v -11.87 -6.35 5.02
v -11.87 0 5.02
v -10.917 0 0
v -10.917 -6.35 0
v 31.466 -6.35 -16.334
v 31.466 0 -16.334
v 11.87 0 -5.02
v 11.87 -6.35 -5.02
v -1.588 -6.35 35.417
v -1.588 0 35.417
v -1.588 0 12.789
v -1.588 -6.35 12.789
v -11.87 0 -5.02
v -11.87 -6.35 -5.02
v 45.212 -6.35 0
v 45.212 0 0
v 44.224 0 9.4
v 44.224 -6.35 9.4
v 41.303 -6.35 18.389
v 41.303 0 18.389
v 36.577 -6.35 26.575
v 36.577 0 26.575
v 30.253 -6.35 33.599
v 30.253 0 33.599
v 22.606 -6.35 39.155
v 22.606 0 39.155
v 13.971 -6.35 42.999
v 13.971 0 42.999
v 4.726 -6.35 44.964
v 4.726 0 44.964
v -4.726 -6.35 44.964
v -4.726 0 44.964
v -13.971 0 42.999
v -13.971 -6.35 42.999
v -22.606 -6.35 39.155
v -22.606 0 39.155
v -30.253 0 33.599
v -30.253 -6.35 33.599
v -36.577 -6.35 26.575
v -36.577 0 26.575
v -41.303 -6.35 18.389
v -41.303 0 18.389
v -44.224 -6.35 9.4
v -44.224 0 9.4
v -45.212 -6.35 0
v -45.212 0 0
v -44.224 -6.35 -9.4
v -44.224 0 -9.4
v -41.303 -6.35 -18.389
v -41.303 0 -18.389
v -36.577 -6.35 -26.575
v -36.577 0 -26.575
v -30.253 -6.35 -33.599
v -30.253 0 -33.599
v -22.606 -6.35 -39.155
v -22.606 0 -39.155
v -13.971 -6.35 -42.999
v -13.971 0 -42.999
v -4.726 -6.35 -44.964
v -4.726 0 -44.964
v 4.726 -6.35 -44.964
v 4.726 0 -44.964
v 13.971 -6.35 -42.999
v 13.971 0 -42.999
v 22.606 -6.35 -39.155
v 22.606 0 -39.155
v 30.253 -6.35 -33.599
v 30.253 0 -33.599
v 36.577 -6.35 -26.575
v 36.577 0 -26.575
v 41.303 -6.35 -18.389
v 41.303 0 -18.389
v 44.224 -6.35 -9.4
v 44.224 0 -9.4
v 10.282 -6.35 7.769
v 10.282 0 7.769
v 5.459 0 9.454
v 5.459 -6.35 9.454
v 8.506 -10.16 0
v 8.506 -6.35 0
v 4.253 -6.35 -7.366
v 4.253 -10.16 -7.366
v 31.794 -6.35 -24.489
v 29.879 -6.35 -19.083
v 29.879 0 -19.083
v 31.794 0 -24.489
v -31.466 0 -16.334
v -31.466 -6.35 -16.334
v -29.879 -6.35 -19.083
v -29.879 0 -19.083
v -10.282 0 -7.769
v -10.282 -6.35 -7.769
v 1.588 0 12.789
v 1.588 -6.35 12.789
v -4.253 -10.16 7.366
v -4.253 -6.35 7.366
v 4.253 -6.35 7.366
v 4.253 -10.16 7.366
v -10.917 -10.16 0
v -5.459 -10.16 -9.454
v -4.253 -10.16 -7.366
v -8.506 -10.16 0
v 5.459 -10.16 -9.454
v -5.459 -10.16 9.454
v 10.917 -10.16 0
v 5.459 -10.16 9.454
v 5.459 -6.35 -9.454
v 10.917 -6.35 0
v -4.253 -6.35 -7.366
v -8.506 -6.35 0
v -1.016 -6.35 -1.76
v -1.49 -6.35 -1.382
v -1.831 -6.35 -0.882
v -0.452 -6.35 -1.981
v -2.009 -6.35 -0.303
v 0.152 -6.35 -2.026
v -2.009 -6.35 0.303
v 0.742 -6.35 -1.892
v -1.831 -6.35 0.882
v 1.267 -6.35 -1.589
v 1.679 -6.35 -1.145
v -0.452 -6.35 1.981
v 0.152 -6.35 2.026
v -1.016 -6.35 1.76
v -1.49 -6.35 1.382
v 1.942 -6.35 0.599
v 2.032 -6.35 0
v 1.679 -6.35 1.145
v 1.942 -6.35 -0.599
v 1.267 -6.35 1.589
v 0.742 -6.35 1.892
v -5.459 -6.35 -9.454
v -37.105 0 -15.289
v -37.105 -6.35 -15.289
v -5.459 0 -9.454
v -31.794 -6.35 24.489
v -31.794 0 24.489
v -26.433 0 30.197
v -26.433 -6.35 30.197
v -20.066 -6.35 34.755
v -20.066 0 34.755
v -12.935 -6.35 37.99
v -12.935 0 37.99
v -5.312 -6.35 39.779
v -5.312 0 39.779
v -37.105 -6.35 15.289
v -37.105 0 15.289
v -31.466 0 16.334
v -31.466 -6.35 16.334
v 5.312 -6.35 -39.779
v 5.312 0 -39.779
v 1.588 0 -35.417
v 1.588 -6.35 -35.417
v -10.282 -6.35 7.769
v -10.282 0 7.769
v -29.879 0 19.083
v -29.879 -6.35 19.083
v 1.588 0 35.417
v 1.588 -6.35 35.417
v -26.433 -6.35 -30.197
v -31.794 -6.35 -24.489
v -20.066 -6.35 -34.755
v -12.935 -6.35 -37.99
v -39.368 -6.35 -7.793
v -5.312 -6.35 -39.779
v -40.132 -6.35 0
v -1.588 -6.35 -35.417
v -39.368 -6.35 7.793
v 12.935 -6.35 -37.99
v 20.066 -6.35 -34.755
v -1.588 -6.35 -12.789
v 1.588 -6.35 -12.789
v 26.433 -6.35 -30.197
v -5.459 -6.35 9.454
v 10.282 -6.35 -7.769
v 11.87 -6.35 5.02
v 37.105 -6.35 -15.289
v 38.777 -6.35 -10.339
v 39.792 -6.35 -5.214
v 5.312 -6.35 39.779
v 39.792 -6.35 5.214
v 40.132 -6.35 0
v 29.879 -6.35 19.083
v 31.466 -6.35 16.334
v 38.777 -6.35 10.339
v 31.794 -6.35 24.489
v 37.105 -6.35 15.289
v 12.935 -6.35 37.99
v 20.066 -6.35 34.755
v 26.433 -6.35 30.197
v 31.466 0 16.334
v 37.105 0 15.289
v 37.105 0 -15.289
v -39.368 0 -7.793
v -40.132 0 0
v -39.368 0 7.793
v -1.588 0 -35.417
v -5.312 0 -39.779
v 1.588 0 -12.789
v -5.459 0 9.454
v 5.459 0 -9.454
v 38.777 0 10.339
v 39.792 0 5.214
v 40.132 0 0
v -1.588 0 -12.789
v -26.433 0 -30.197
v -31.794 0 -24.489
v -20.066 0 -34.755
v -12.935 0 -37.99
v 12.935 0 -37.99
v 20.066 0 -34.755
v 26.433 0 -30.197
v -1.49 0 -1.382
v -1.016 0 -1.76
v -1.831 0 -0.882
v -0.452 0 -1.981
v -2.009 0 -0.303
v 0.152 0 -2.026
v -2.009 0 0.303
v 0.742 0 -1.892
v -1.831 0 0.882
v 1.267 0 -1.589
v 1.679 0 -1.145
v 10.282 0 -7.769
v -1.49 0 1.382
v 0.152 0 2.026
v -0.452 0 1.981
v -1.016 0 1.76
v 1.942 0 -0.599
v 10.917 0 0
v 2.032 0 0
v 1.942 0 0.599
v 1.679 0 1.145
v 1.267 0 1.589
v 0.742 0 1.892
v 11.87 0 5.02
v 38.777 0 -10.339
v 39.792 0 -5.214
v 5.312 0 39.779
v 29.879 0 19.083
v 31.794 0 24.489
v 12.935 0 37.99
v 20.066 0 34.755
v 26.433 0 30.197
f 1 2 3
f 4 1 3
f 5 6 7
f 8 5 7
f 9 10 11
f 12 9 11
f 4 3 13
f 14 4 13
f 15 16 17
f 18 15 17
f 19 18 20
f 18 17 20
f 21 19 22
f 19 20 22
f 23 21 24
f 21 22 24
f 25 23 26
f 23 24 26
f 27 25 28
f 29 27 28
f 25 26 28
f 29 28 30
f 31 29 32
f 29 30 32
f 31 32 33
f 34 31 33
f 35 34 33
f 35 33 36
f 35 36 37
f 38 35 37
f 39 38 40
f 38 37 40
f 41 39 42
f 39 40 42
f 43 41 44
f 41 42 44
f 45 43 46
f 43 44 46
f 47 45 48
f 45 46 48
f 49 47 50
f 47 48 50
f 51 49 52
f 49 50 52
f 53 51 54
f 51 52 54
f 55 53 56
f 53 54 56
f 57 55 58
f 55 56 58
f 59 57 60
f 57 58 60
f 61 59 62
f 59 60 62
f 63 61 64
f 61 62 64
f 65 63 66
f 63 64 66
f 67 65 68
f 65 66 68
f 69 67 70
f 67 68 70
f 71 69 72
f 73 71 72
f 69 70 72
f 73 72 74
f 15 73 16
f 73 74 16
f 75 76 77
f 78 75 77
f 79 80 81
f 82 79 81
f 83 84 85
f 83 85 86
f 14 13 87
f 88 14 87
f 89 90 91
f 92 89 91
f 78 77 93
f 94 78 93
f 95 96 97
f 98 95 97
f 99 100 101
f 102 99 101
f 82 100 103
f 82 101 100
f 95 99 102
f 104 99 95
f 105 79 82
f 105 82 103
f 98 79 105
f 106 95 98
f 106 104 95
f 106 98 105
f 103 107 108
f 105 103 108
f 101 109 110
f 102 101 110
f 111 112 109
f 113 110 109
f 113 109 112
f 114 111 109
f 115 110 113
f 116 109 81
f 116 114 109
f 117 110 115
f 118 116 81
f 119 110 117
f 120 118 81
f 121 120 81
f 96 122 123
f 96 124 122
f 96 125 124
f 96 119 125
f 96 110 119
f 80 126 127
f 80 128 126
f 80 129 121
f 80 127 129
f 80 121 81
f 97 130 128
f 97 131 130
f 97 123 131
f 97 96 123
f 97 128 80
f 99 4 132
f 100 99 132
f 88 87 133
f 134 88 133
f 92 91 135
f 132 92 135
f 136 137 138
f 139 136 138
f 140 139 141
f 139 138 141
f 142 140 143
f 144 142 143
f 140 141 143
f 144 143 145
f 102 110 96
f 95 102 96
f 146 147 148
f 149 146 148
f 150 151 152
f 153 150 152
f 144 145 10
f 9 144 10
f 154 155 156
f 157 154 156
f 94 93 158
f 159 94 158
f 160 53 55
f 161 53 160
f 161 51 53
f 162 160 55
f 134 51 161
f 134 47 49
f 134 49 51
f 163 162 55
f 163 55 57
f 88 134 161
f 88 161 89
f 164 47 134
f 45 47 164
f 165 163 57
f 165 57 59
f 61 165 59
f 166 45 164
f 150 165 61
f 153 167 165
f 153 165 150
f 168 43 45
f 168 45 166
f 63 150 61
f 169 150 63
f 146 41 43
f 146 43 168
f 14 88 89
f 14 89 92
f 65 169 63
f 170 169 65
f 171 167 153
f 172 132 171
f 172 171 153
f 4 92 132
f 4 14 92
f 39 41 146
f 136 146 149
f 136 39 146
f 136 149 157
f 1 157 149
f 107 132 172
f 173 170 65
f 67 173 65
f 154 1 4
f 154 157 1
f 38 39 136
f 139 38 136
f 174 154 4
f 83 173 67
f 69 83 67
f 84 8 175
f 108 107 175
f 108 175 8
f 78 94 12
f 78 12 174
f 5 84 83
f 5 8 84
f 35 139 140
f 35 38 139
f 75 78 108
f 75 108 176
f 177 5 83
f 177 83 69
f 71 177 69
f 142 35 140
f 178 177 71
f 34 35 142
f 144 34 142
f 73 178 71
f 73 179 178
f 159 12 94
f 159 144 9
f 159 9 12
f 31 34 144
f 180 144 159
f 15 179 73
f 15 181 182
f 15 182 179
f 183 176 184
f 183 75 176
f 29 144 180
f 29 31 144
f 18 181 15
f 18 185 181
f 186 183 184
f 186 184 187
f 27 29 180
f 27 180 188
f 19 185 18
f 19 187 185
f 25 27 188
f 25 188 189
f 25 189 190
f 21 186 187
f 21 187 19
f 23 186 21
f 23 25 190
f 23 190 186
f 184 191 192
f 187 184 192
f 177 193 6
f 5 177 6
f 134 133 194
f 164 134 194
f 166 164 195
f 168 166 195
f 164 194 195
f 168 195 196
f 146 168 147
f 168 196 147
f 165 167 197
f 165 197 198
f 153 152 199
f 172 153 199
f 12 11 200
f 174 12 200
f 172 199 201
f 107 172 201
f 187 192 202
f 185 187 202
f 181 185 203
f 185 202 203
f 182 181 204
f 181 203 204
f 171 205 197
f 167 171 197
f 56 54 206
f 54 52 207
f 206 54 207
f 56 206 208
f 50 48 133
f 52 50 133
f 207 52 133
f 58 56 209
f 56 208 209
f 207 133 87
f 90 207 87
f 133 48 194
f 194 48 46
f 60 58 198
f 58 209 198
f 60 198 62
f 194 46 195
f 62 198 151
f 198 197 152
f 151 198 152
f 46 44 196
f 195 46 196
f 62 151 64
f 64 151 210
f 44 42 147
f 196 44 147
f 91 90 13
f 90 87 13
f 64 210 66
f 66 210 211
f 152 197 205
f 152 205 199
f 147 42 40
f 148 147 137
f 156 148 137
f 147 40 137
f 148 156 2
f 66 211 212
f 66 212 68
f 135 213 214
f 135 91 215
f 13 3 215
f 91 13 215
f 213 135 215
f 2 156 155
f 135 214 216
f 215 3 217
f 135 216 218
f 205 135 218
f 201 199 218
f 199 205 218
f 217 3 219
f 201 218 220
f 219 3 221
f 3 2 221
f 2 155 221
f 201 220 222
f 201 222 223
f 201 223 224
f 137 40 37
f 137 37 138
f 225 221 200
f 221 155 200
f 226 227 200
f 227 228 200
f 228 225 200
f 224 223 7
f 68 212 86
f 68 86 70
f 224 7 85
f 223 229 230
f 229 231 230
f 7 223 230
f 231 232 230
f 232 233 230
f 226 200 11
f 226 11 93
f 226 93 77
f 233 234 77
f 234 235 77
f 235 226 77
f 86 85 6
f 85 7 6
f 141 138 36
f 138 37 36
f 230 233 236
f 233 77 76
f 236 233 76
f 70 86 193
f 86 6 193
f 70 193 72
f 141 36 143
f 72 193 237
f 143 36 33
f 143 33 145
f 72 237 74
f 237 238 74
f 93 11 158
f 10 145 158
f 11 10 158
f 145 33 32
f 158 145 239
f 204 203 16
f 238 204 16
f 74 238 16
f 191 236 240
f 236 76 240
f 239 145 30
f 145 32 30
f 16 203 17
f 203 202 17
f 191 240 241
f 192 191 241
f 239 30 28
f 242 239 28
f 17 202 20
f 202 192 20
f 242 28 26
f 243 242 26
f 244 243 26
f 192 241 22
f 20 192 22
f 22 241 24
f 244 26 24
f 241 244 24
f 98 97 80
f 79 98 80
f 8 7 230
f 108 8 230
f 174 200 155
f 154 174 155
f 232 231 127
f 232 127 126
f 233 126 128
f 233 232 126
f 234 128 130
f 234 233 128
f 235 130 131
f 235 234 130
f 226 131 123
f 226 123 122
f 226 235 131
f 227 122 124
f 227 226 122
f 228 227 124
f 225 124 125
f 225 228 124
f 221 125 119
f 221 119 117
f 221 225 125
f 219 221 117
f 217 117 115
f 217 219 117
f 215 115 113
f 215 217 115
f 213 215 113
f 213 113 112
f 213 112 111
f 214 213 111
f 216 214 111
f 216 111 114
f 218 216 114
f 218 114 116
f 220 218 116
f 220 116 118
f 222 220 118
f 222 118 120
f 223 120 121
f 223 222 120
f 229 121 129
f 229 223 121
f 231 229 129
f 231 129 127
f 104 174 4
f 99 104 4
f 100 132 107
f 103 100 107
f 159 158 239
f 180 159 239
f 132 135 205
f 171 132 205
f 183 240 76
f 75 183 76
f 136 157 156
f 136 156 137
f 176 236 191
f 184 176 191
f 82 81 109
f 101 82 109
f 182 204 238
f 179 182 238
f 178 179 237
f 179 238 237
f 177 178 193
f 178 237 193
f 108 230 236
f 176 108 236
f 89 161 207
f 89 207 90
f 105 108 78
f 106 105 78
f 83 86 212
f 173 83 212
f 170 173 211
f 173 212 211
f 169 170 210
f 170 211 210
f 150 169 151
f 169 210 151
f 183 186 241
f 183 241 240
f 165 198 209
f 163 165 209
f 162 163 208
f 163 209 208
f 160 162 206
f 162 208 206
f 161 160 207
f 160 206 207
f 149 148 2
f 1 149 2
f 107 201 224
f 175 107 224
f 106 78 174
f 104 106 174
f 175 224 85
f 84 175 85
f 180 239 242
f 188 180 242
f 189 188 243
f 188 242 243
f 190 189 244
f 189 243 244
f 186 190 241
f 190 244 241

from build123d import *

# Parameters (mm, degrees)
F0_R     = 45.212
F0_R_2   = 2.032
F1_DEPTH = 6.35
F2_DEPTH = 10.16


with BuildPart() as f1:
    # F0 (on Front) → F1 (new body)
    with BuildSketch(Plane.XZ):
        Circle(F0_R)
        with BuildLine():
            ThreePointArc((37.1053751064, 15.2894918888), (39.3680729638, 7.7930902161), (40.132, 0))
            ThreePointArc((40.132, 0), (39.3680729638, -7.7930902161), (37.1053751064, -15.2894918888))
            ThreePointArc((37.1053751064, -15.2894918888), (34.7553315047, -20.066), (31.7937759398, -24.4894515147))
            ThreePointArc((31.7937759398, -24.4894515147), (20.066, -34.7553315047), (5.3115991666, -39.7789434034))
            ThreePointArc((5.3115991666, -39.7789434034), (0, -40.132), (-5.3115991666, -39.7789434034))
            ThreePointArc((-5.3115991666, -39.7789434034), (-20.066, -34.7553315047), (-31.7937759398, -24.4894515147))
            ThreePointArc((-31.7937759398, -24.4894515147), (-34.7553315047, -20.066), (-37.1053751064, -15.2894918888))
            ThreePointArc((-37.1053751064, -15.2894918888), (-40.132, 0), (-37.1053751064, 15.2894918888))
            ThreePointArc((-37.1053751064, 15.2894918888), (-34.7553315047, 20.066), (-31.7937759398, 24.4894515147))
            ThreePointArc((-31.7937759398, 24.4894515147), (-20.066, 34.7553315047), (-5.3115991666, 39.7789434034))
            ThreePointArc((-5.3115991666, 39.7789434034), (0, 40.132), (5.3115991666, 39.7789434034))
            ThreePointArc((5.3115991666, 39.7789434034), (20.066, 34.7553315047), (31.7937759398, 24.4894515147))
            ThreePointArc((31.7937759398, 24.4894515147), (34.7553315047, 20.066), (37.1053751064, 15.2894918888))
        make_face(mode=Mode.SUBTRACT)
        Polygon((4.2527620829, -7.366), (8.5055241657, 0), (4.2527620829, 7.366), (-4.2527620829, 7.366), (-8.5055241657, 0), (-4.2527620829, -7.366), align=None)
        Circle(F0_R_2, mode=Mode.SUBTRACT)
        with BuildLine():
            Line((1.5875, 35.4173183441), (5.3115991666, 39.7789434034))
            ThreePointArc((5.3115991666, 39.7789434034), (0, 40.132), (-5.3115991666, 39.7789434034))
            Line((-5.3115991666, 39.7789434034), (-1.5875, 35.4173183441))
            Line((-1.5875, 35.4173183441), (-1.5875, 12.7893453464))
            Line((-1.5875, 12.7893453464), (-5.4585231293, 9.4544393942))
            Line((-5.4585231293, 9.4544393942), (5.4585231293, 9.4544393942))
            Line((5.4585231293, 9.4544393942), (1.5875, 12.7893453464))
            Line((1.5875, 12.7893453464), (1.5875, 35.4173183441))
        make_face()
        with BuildLine():
            Line((-29.8785474199, 19.0834745006), (-31.7937759398, 24.4894515147))
            ThreePointArc((-31.7937759398, 24.4894515147), (-34.7553315047, 20.066), (-37.1053751064, 15.2894918888))
            Line((-37.1053751064, 15.2894918888), (-31.4660474199, 16.3338438436))
            Line((-31.4660474199, 16.3338438436), (-11.8696479677, 5.0198573447))
            Line((-11.8696479677, 5.0198573447), (-10.9170462585, 0))
            Line((-10.9170462585, 0), (-5.4585231293, 9.4544393942))
            Line((-5.4585231293, 9.4544393942), (-10.2821479677, 7.7694880017))
            Line((-10.2821479677, 7.7694880017), (-29.8785474199, 19.0834745006))
        make_face()
        with BuildLine():
            ThreePointArc((-37.1053751064, -15.2894918888), (-34.7553315047, -20.066), (-31.7937759398, -24.4894515147))
            Line((-31.7937759398, -24.4894515147), (-29.8785474199, -19.0834745006))
            Line((-29.8785474199, -19.0834745006), (-10.2821479677, -7.7694880017))
            Line((-10.2821479677, -7.7694880017), (-5.4585231293, -9.4544393942))
            Line((-5.4585231293, -9.4544393942), (-10.9170462585, 0))
            Line((-10.9170462585, 0), (-11.8696479677, -5.0198573447))
            Line((-11.8696479677, -5.0198573447), (-31.4660474199, -16.3338438436))
            Line((-31.4660474199, -16.3338438436), (-37.1053751064, -15.2894918888))
        make_face()
        with BuildLine():
            ThreePointArc((-5.3115991666, -39.7789434034), (0, -40.132), (5.3115991666, -39.7789434034))
            Line((5.3115991666, -39.7789434034), (1.5875, -35.4173183441))
            Line((1.5875, -35.4173183441), (1.5875, -12.7893453464))
            Line((1.5875, -12.7893453464), (5.4585231293, -9.4544393942))
            Line((5.4585231293, -9.4544393942), (-5.4585231293, -9.4544393942))
            Line((-5.4585231293, -9.4544393942), (-1.5875, -12.7893453464))
            Line((-1.5875, -12.7893453464), (-1.5875, -35.4173183441))
            Line((-1.5875, -35.4173183441), (-5.3115991666, -39.7789434034))
        make_face()
        with BuildLine():
            ThreePointArc((31.7937759398, -24.4894515147), (34.7553315047, -20.066), (37.1053751064, -15.2894918888))
            Line((37.1053751064, -15.2894918888), (31.4660474199, -16.3338438436))
            Line((31.4660474199, -16.3338438436), (11.8696479677, -5.0198573447))
            Line((11.8696479677, -5.0198573447), (10.9170462585, 0))
            Line((10.9170462585, 0), (5.4585231293, -9.4544393942))
            Line((5.4585231293, -9.4544393942), (10.2821479677, -7.7694880017))
            Line((10.2821479677, -7.7694880017), (29.8785474199, -19.0834745006))
            Line((29.8785474199, -19.0834745006), (31.7937759398, -24.4894515147))
        make_face()
        with BuildLine():
            Line((31.4660474199, 16.3338438436), (37.1053751064, 15.2894918888))
            ThreePointArc((37.1053751064, 15.2894918888), (34.7553315047, 20.066), (31.7937759398, 24.4894515147))
            Line((31.7937759398, 24.4894515147), (29.8785474199, 19.0834745006))
            Line((29.8785474199, 19.0834745006), (10.2821479677, 7.7694880017))
            Line((10.2821479677, 7.7694880017), (5.4585231293, 9.4544393942))
            Line((5.4585231293, 9.4544393942), (10.9170462585, 0))
            Line((10.9170462585, 0), (11.8696479677, 5.0198573447))
            Line((11.8696479677, 5.0198573447), (31.4660474199, 16.3338438436))
        make_face()
        Polygon((-4.2527620829, 7.366), (-5.4585231293, 9.4544393942), (-10.9170462585, 0), (-8.5055241657, 0), align=None)
        Polygon((-10.9170462585, 0), (-5.4585231293, -9.4544393942), (-4.2527620829, -7.366), (-8.5055241657, 0), align=None)
        Polygon((-5.4585231293, -9.4544393942), (5.4585231293, -9.4544393942), (4.2527620829, -7.366), (-4.2527620829, -7.366), align=None)
        Polygon((5.4585231293, -9.4544393942), (10.9170462585, 0), (8.5055241657, 0), (4.2527620829, -7.366), align=None)
        Polygon((8.5055241657, 0), (10.9170462585, 0), (5.4585231293, 9.4544393942), (4.2527620829, 7.366), align=None)
        Polygon((4.2527620829, 7.366), (5.4585231293, 9.4544393942), (-5.4585231293, 9.4544393942), (-4.2527620829, 7.366), align=None)
    extrude(amount=F1_DEPTH)

    # F0 (on Front) → F2 (join)
    with BuildSketch(Plane.XZ):
        Polygon((-10.9170462585, 0), (-5.4585231293, -9.4544393942), (-4.2527620829, -7.366), (-8.5055241657, 0), align=None)
        Polygon((-5.4585231293, -9.4544393942), (5.4585231293, -9.4544393942), (4.2527620829, -7.366), (-4.2527620829, -7.366), align=None)
        Polygon((5.4585231293, -9.4544393942), (10.9170462585, 0), (8.5055241657, 0), (4.2527620829, -7.366), align=None)
        Polygon((8.5055241657, 0), (10.9170462585, 0), (5.4585231293, 9.4544393942), (4.2527620829, 7.366), align=None)
        Polygon((4.2527620829, 7.366), (5.4585231293, 9.4544393942), (-5.4585231293, 9.4544393942), (-4.2527620829, 7.366), align=None)
        Polygon((-4.2527620829, 7.366), (-5.4585231293, 9.4544393942), (-10.9170462585, 0), (-8.5055241657, 0), align=None)
    extrude(amount=F2_DEPTH)


solid = f1.part
